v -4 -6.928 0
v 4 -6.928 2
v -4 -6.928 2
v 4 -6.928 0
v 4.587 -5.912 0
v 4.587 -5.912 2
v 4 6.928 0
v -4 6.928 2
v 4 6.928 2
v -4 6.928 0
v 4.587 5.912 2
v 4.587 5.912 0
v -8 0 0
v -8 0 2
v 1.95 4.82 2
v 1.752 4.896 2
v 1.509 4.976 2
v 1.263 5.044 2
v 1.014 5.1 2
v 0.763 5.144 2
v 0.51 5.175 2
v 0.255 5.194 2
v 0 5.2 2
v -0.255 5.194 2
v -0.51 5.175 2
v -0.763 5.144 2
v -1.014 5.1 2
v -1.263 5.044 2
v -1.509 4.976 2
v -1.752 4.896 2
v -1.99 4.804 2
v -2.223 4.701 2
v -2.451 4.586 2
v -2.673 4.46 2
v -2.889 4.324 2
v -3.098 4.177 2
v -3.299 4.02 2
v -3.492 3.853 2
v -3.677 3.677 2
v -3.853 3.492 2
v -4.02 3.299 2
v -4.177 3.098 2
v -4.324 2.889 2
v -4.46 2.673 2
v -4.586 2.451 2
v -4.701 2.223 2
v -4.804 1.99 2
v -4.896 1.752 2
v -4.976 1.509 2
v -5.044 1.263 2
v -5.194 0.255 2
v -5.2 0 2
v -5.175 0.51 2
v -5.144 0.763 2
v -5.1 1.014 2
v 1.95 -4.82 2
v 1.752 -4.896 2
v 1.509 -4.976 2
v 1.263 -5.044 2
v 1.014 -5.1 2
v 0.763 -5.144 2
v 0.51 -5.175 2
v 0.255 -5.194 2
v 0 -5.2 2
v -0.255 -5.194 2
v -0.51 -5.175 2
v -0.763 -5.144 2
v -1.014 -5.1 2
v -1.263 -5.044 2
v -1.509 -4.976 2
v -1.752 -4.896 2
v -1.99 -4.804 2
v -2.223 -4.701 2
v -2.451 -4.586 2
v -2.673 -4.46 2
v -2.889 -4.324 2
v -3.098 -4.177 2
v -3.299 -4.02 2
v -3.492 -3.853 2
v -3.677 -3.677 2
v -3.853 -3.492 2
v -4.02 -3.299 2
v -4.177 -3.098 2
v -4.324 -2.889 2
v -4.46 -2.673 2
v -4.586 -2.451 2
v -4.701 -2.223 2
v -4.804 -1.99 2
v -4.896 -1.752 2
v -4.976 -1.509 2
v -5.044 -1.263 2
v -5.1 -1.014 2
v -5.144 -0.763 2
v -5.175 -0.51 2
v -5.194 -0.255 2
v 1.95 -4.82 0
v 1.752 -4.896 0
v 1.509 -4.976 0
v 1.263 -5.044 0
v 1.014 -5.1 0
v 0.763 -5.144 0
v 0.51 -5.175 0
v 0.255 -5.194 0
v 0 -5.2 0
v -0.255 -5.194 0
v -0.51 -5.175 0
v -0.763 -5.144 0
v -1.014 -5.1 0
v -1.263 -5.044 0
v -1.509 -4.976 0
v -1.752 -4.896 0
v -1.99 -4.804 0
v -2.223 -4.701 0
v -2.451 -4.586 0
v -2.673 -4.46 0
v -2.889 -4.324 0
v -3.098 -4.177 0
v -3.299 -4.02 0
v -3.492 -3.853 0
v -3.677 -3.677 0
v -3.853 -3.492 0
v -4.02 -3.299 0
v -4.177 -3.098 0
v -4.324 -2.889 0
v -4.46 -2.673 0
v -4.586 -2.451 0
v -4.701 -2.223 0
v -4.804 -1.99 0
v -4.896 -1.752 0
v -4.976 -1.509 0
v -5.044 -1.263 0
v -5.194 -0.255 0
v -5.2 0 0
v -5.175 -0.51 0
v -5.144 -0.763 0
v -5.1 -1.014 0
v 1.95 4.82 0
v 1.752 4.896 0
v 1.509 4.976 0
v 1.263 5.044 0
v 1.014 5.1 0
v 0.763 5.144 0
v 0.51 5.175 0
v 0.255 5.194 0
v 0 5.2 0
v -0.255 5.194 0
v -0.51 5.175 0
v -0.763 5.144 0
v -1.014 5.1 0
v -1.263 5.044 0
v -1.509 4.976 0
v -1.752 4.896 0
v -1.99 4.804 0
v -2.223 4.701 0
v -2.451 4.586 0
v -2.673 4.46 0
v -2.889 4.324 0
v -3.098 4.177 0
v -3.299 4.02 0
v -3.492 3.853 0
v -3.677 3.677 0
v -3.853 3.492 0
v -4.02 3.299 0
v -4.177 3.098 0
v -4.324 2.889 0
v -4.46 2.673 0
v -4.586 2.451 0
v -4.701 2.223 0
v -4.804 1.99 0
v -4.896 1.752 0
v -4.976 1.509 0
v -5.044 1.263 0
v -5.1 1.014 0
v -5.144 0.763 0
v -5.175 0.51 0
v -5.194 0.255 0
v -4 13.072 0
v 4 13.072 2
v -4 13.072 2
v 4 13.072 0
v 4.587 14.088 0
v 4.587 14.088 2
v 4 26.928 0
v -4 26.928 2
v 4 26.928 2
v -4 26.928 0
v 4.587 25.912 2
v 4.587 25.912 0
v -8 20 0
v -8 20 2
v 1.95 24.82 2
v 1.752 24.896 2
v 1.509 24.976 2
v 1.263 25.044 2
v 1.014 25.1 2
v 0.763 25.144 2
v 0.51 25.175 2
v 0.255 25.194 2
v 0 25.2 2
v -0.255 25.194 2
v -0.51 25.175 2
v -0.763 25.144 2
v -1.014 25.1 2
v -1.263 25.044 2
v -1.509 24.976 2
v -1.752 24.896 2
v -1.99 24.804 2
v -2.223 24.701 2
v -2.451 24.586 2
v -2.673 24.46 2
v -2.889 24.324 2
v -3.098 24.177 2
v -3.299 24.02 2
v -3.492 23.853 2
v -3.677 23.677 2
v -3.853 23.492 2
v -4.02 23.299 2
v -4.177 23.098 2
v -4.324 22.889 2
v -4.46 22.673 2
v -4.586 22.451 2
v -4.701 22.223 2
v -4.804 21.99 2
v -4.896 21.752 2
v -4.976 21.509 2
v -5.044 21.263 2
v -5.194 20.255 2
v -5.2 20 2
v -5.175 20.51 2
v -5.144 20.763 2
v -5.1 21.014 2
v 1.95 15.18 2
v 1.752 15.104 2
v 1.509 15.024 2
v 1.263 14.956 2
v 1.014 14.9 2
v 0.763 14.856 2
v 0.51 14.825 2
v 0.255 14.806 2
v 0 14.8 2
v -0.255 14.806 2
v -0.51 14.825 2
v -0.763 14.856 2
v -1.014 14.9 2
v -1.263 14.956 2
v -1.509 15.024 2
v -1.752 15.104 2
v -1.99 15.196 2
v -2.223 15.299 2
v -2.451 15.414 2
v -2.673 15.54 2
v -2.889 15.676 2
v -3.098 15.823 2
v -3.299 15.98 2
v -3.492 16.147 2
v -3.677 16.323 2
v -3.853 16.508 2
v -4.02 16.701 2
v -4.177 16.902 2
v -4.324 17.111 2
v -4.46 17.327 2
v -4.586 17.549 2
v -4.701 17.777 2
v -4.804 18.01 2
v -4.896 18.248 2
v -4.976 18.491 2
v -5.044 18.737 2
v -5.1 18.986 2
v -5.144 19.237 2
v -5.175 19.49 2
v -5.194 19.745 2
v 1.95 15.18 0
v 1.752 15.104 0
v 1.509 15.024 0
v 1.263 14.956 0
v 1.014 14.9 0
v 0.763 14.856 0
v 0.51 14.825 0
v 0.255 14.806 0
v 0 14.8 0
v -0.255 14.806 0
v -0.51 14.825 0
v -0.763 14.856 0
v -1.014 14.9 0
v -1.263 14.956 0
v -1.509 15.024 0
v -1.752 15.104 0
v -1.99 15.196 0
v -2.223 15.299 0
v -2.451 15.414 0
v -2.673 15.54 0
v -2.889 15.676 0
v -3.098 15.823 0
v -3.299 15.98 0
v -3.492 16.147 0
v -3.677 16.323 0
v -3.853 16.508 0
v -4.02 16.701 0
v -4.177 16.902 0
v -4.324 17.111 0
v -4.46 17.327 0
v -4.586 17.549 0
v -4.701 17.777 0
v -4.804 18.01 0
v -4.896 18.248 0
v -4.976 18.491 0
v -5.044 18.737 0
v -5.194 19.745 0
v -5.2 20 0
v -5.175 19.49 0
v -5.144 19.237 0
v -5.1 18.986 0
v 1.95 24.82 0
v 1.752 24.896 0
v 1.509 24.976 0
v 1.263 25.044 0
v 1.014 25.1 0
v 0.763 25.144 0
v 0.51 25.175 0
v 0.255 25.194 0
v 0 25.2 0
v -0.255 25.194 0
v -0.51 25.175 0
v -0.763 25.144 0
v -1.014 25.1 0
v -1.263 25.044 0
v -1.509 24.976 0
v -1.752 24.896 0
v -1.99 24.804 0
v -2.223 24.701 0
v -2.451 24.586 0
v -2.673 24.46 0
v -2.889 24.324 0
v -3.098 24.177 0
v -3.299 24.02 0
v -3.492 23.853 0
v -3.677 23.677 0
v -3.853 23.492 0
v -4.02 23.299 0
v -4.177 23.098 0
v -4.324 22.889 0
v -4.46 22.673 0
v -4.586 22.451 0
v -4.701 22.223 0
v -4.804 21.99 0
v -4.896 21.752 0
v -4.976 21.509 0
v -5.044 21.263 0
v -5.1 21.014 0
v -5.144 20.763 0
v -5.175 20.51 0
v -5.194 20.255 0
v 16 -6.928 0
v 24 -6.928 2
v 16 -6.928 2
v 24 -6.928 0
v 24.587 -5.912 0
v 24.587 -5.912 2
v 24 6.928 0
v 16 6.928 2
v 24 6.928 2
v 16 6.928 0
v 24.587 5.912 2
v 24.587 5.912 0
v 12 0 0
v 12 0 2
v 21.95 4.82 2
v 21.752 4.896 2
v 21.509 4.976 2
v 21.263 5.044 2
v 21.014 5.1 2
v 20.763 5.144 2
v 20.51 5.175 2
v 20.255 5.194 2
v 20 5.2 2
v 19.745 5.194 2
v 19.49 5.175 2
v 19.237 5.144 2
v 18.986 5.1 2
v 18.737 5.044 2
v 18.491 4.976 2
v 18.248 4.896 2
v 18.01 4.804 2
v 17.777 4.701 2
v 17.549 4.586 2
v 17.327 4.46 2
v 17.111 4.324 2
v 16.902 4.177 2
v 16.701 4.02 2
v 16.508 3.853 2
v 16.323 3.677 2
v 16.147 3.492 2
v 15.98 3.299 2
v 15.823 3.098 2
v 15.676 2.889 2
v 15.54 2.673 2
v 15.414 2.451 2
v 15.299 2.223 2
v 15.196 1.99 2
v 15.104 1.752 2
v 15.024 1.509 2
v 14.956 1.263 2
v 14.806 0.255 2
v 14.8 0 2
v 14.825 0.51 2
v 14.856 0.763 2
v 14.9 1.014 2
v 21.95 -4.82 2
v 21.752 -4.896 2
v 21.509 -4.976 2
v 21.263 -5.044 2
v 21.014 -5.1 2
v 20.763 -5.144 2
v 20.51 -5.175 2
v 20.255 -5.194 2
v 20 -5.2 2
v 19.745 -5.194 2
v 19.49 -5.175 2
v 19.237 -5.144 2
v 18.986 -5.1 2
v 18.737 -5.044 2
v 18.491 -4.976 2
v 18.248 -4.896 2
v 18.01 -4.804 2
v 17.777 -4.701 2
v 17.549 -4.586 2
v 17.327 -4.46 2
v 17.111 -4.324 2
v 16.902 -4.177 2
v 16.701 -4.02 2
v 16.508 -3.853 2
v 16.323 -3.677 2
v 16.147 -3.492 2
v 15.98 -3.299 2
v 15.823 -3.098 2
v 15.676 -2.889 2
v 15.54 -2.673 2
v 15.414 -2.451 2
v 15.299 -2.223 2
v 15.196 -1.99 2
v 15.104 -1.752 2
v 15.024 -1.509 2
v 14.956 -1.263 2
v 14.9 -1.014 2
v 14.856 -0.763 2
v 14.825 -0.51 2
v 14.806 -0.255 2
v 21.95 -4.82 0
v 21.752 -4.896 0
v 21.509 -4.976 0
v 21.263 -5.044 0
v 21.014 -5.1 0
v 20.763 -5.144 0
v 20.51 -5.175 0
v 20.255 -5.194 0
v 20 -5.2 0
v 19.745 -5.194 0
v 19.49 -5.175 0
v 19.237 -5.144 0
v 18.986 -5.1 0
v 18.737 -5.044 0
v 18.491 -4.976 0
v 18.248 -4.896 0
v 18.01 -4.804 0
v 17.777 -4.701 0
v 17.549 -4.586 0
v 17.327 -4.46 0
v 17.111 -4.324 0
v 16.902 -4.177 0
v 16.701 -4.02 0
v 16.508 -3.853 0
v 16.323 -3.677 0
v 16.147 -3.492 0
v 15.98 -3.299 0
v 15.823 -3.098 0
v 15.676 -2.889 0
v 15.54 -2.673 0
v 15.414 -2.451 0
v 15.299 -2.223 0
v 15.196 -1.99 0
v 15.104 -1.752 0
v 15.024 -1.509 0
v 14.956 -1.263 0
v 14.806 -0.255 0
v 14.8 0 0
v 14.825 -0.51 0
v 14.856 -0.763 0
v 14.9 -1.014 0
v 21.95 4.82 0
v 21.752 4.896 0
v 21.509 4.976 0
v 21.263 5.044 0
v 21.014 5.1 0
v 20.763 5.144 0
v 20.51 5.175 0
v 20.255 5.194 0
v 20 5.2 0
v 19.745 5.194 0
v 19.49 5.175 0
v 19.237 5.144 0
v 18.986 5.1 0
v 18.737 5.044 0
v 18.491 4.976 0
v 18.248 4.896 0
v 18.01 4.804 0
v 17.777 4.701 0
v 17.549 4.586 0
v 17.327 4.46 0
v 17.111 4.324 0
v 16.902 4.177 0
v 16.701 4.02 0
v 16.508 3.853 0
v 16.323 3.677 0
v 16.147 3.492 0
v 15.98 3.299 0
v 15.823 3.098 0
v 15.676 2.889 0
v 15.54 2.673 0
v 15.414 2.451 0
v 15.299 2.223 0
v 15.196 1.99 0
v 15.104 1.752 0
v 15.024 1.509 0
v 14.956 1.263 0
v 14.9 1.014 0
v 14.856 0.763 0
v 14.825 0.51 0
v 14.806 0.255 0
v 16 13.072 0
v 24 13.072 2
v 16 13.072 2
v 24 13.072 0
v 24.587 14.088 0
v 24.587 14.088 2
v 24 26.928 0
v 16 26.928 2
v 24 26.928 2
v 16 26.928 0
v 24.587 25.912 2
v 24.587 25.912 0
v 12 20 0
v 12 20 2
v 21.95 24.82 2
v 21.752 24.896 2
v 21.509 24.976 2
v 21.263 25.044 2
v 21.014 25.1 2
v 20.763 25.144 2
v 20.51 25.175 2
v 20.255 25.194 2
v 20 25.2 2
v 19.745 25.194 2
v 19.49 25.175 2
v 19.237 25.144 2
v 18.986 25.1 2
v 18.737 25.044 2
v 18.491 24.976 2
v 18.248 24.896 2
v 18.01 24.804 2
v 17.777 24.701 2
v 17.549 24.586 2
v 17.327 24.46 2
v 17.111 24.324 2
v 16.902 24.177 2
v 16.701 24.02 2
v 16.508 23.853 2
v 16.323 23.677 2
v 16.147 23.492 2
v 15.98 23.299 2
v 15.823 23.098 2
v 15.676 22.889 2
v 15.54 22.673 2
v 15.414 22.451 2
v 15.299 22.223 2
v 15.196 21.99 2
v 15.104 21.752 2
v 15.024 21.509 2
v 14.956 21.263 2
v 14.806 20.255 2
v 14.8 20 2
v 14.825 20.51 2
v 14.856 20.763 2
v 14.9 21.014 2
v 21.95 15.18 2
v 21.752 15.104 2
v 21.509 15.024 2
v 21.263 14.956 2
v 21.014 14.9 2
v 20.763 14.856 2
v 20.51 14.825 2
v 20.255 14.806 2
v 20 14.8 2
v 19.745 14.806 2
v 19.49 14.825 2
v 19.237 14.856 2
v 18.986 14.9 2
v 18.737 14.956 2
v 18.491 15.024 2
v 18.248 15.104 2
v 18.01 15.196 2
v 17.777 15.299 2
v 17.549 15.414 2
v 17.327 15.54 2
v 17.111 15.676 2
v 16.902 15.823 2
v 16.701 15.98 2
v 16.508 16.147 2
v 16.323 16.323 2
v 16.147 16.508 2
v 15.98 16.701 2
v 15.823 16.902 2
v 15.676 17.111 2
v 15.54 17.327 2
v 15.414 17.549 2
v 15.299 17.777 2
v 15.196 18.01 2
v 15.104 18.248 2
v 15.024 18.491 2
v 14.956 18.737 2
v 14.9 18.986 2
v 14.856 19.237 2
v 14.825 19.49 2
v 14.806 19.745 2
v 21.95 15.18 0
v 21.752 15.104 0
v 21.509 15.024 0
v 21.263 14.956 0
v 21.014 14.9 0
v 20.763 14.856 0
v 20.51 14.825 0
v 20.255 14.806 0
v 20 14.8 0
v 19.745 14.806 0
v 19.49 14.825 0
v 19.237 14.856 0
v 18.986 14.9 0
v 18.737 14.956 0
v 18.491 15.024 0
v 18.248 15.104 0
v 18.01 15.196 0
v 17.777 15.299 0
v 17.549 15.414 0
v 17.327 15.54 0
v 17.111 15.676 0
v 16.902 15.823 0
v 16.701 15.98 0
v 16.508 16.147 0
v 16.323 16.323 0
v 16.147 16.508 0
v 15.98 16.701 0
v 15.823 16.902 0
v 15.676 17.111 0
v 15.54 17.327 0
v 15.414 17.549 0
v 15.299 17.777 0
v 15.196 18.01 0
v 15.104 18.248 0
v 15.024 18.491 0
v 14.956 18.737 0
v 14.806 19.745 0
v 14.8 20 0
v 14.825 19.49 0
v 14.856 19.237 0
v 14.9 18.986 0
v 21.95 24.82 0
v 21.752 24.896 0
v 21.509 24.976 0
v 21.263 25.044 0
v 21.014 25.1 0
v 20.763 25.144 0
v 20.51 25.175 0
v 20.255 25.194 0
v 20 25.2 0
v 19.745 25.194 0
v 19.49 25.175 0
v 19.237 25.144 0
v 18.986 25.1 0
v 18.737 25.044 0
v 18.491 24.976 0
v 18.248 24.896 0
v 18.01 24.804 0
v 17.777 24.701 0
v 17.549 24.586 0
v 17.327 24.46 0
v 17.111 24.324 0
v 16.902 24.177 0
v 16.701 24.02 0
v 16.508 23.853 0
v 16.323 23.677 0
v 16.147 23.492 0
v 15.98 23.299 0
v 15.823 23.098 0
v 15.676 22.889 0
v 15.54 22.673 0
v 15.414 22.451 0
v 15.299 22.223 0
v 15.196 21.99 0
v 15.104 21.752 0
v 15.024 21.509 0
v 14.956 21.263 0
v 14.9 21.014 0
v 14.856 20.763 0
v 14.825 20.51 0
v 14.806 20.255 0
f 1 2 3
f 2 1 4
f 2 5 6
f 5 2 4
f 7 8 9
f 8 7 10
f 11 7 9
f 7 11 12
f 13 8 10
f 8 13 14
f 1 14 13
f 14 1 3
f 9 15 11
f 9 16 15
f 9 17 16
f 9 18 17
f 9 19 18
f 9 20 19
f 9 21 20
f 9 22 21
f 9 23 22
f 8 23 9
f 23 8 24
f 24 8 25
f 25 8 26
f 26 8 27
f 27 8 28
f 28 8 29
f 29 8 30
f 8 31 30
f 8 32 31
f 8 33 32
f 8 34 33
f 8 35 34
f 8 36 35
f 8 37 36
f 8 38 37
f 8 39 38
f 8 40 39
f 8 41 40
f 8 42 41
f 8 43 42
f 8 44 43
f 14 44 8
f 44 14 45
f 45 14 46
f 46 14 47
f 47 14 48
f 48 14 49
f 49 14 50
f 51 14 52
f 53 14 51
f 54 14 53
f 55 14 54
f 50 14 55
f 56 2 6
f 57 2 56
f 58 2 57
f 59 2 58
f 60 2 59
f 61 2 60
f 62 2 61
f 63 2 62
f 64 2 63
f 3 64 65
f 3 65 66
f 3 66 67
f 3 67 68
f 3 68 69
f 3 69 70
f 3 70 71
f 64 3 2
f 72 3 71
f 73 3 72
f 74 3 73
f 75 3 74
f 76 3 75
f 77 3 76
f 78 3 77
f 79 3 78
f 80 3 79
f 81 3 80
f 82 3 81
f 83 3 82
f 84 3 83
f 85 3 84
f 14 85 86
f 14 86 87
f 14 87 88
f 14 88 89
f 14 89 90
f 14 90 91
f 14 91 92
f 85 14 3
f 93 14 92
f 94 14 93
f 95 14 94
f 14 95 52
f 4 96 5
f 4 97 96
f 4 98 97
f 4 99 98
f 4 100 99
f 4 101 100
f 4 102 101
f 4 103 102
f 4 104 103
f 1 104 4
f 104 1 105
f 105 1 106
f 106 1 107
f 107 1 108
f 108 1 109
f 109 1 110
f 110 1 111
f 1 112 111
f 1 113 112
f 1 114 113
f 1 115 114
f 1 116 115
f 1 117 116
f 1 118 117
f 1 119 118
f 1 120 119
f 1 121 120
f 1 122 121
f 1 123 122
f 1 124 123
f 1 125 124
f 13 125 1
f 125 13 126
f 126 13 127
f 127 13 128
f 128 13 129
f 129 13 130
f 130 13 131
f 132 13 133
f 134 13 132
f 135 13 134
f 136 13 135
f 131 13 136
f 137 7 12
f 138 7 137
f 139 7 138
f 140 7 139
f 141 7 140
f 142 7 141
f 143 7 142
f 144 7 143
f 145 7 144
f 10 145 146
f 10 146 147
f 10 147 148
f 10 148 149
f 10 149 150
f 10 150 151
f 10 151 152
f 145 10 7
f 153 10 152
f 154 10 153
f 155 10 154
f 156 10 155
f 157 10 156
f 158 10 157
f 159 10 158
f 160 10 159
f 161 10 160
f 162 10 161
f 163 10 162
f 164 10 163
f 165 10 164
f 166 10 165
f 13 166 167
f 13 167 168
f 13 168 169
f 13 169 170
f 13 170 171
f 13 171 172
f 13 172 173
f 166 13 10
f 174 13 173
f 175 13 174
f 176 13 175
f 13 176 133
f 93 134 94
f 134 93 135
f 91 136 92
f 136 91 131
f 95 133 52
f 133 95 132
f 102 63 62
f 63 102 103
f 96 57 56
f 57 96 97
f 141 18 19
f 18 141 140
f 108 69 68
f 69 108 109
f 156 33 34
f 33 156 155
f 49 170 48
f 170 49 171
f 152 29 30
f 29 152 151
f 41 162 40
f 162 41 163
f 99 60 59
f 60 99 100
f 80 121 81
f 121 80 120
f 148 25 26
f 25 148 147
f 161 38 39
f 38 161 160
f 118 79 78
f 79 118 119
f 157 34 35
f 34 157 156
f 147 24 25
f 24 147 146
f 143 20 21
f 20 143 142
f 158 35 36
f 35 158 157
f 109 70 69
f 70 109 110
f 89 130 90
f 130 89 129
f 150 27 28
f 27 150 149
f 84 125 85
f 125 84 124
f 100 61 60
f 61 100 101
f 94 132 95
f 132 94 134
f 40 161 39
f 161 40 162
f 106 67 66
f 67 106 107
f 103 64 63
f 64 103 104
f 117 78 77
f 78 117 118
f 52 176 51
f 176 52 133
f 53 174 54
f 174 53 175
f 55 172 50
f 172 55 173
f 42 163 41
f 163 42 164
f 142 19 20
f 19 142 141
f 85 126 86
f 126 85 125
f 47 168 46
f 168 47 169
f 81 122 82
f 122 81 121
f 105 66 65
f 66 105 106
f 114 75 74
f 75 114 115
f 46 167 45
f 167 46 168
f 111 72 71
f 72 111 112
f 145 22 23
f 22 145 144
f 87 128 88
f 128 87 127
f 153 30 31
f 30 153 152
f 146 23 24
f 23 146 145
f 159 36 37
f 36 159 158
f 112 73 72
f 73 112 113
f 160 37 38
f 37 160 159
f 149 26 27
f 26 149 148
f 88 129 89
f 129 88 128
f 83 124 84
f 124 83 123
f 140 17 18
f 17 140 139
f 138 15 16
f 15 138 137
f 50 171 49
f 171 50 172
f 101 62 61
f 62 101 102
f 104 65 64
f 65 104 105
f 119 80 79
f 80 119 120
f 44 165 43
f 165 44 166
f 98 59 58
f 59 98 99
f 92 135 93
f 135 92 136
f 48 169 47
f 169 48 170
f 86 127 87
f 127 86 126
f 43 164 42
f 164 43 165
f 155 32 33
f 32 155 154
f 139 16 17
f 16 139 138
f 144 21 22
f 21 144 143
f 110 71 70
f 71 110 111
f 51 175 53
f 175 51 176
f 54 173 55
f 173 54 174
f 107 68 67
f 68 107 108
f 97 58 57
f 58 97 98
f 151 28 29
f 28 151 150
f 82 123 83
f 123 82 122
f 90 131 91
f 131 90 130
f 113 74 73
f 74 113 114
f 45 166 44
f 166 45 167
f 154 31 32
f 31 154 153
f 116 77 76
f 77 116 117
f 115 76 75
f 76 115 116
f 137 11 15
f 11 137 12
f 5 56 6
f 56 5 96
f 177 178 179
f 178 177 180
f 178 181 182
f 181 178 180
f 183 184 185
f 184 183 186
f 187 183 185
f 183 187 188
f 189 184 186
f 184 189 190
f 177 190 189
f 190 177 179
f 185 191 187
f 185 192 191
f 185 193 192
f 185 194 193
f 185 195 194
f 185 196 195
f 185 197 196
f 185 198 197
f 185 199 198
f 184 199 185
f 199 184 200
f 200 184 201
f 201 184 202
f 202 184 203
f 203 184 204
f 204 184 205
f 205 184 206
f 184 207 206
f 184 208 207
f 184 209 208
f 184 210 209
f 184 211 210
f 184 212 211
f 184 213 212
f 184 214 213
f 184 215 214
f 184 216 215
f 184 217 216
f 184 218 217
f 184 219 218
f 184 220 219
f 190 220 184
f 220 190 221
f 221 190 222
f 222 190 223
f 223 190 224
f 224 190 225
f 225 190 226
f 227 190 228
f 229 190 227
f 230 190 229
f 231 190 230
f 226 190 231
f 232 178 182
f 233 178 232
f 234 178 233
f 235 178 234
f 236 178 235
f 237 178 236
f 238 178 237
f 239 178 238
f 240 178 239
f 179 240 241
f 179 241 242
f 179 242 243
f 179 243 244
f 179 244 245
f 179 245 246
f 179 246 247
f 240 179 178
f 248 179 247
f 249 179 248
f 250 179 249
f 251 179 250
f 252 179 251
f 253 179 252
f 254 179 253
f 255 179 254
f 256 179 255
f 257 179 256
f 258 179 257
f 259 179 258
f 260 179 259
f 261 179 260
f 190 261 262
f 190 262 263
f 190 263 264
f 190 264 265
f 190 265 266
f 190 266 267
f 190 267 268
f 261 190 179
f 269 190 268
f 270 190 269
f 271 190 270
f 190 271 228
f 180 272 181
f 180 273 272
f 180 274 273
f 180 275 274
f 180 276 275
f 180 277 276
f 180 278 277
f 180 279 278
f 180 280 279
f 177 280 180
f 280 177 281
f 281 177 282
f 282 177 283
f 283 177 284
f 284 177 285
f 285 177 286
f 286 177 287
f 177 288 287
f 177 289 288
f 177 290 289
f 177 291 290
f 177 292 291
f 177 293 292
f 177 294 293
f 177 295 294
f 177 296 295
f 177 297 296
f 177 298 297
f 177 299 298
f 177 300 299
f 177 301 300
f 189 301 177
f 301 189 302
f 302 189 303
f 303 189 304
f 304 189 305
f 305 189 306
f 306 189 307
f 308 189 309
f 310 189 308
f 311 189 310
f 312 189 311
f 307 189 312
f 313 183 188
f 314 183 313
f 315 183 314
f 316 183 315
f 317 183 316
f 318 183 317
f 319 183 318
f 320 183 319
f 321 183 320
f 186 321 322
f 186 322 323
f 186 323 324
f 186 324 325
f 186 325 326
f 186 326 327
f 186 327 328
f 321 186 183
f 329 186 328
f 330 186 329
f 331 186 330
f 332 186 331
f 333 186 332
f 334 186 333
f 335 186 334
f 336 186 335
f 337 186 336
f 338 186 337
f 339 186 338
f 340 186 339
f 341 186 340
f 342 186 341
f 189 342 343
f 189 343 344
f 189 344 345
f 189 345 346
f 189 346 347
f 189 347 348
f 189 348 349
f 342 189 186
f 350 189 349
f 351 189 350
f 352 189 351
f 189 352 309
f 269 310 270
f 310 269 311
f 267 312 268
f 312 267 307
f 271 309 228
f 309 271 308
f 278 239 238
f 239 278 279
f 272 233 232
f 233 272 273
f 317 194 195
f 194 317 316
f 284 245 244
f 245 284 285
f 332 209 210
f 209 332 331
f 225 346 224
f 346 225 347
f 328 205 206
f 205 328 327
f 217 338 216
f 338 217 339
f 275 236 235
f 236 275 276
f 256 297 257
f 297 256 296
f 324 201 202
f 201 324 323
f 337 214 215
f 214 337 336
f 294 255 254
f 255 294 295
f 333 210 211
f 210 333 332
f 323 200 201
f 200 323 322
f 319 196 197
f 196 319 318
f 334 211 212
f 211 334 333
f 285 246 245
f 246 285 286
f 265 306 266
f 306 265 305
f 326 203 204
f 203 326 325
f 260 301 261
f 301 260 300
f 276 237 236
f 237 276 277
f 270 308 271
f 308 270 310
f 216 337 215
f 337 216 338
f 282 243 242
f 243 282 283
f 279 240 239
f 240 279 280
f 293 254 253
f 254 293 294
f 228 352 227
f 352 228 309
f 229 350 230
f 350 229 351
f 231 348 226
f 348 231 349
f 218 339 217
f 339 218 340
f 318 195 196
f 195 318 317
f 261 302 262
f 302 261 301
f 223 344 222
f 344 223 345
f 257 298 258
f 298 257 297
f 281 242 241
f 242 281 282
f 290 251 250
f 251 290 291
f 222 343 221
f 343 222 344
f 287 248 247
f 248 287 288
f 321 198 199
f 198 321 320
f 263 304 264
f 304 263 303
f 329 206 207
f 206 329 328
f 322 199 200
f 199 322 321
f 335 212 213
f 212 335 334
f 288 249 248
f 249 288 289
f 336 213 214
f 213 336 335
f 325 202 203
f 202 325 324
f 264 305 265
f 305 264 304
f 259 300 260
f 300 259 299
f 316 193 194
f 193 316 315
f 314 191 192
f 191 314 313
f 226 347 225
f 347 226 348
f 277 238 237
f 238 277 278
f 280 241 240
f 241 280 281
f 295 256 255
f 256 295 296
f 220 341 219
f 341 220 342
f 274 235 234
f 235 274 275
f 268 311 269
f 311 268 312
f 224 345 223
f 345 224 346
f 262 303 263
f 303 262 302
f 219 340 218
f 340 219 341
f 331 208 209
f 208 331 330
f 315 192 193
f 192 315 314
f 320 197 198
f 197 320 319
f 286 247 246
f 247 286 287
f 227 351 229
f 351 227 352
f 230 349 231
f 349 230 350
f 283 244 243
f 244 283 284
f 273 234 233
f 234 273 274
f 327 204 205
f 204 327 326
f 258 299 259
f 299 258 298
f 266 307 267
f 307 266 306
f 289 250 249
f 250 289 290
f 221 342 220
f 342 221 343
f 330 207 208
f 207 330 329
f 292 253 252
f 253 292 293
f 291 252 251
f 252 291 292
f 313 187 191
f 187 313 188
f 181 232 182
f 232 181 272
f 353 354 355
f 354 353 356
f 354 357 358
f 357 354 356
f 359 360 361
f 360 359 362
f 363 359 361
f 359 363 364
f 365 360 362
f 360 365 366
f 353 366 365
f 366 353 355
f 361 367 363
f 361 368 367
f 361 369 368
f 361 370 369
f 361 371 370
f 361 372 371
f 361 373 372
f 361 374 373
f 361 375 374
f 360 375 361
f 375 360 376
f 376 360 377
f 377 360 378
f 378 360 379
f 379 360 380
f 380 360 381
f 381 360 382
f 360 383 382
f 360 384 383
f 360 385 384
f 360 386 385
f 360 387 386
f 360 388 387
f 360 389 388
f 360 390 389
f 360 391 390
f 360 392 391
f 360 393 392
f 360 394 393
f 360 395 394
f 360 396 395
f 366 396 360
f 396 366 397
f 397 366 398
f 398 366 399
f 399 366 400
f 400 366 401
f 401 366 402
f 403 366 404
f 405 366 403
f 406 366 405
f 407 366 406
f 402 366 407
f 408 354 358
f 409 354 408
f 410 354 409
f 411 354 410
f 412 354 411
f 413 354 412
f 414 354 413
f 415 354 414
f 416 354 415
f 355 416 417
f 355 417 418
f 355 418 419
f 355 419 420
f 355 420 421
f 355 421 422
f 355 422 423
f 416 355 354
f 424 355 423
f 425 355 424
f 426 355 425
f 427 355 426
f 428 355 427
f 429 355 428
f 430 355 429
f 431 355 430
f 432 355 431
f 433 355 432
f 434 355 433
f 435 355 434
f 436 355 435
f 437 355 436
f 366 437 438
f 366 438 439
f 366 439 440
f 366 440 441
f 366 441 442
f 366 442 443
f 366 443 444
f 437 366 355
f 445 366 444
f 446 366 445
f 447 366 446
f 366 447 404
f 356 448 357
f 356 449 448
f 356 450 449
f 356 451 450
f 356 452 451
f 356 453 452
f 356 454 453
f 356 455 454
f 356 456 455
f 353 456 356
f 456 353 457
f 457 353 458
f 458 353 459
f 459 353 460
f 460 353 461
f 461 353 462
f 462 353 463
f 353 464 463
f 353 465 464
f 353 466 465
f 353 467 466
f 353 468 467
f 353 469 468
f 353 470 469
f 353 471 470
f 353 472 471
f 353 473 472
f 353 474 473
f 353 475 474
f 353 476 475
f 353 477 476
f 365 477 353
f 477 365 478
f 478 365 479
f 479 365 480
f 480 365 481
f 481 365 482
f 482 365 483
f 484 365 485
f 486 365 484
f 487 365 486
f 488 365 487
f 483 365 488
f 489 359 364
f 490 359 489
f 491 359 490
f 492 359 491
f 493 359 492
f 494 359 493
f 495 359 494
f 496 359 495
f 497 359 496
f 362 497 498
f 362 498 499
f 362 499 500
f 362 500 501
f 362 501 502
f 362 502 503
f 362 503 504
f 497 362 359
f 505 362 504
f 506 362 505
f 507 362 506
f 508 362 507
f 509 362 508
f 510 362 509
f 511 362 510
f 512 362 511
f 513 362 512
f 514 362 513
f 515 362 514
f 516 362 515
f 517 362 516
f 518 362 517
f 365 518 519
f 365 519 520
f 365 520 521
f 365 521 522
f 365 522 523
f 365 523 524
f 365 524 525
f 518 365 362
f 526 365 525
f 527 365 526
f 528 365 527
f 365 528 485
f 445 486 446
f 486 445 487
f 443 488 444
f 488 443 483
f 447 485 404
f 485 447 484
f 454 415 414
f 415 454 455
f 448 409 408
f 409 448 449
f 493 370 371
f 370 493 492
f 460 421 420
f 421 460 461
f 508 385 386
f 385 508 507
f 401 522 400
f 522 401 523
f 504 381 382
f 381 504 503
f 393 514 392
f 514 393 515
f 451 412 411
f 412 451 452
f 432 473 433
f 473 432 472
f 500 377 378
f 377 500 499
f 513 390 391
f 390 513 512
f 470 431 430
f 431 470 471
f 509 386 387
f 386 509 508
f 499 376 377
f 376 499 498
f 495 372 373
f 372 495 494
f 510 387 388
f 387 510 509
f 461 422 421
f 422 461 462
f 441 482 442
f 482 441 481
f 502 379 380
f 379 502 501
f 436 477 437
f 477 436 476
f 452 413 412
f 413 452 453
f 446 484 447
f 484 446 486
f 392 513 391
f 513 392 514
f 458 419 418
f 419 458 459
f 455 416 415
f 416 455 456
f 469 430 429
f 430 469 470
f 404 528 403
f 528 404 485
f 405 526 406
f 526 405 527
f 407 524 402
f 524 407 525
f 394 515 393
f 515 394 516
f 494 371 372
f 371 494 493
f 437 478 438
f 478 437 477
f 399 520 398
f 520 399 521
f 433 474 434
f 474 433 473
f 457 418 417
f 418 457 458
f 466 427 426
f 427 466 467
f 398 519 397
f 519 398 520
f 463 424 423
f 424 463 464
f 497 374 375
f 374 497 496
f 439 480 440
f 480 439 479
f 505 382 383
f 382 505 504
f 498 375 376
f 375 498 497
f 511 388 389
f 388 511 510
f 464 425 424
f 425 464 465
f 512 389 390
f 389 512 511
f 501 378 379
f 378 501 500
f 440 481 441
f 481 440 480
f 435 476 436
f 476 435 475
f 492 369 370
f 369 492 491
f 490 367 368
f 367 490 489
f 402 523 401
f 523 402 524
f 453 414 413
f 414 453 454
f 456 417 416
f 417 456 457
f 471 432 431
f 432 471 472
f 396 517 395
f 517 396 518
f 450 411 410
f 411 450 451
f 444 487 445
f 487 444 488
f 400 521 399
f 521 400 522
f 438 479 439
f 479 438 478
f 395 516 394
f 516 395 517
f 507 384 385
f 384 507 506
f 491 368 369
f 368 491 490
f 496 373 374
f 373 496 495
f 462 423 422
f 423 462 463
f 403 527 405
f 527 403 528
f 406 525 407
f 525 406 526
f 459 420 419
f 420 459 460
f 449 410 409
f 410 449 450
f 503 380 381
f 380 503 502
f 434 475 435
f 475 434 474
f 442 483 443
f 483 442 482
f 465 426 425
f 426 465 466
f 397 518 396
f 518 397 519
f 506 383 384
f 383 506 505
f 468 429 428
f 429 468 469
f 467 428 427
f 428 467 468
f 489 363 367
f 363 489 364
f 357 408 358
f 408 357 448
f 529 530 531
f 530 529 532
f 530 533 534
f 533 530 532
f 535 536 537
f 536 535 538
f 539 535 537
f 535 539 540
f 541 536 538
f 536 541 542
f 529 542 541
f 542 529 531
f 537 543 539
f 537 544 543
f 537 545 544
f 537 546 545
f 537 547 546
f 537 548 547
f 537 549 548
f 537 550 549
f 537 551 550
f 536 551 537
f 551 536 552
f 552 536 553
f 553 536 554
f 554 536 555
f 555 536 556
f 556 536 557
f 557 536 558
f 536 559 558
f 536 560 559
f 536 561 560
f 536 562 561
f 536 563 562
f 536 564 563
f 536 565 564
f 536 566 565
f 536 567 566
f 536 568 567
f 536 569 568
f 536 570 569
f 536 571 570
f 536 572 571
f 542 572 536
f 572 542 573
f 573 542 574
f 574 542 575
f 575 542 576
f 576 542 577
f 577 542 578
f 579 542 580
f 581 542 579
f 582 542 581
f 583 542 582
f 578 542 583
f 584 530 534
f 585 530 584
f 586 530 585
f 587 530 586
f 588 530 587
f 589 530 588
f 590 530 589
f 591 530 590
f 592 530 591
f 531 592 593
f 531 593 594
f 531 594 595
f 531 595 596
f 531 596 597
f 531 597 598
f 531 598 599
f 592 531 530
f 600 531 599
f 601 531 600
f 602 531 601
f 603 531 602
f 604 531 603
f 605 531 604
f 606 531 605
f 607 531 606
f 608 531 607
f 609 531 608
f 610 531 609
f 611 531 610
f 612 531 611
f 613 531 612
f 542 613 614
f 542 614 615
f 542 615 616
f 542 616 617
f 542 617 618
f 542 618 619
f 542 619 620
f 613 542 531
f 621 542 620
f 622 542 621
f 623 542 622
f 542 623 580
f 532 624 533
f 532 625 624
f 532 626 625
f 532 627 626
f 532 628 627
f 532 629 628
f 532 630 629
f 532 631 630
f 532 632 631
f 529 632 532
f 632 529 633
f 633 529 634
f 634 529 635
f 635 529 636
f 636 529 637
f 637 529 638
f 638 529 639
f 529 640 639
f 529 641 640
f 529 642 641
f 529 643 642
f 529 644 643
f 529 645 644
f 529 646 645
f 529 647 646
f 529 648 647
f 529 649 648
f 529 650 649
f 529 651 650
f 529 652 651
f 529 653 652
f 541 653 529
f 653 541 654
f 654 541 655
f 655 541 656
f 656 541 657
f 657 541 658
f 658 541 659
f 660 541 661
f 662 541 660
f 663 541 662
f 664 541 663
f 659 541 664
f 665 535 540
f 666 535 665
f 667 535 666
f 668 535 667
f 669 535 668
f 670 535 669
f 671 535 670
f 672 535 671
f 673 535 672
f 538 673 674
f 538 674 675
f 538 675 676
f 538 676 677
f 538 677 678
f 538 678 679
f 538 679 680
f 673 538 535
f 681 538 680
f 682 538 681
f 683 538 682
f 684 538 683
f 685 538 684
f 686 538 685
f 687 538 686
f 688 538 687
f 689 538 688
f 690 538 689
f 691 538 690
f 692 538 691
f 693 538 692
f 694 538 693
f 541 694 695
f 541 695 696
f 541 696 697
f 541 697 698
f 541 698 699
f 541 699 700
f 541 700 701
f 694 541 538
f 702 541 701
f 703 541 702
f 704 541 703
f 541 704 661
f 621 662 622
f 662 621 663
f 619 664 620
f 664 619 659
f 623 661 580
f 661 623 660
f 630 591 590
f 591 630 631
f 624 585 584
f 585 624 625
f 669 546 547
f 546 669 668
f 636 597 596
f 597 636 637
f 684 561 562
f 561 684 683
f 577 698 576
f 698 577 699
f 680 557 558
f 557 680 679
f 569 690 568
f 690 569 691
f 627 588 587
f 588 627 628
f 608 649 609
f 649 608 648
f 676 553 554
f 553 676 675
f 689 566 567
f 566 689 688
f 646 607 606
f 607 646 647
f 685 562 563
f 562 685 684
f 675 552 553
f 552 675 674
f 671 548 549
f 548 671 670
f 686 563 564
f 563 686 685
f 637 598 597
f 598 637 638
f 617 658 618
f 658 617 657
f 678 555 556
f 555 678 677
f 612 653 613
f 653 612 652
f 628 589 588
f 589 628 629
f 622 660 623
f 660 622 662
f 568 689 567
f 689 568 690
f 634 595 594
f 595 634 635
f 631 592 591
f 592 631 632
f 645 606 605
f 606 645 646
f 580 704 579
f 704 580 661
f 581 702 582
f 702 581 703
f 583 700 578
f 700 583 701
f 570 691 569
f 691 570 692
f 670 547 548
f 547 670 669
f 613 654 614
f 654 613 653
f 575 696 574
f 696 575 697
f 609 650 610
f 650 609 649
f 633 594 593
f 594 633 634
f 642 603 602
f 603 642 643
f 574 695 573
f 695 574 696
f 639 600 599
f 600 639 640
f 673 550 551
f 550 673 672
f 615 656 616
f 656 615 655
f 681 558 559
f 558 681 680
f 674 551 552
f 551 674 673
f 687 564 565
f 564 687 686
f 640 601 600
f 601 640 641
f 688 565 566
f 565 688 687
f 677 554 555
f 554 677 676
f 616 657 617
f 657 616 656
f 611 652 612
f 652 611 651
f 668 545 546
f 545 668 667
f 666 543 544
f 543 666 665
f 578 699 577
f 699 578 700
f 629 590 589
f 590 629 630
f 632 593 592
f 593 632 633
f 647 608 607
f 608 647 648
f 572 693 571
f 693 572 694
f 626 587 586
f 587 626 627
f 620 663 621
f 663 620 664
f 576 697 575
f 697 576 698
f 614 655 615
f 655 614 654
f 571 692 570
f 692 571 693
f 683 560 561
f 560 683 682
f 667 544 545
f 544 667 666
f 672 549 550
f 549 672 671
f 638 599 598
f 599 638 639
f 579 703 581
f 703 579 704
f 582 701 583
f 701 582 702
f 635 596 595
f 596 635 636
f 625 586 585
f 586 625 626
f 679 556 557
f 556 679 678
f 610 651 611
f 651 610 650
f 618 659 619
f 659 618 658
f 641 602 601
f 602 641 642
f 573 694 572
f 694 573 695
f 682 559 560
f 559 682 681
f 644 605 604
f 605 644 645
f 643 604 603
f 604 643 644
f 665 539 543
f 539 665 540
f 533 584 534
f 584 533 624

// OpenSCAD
// Clip parts for nozzle changer
// by Genie Kibayashi, July 2016

$fn=128;
r_margin = 0.4;

//T2
module clip(){
difference(){
cylinder(h=2, r=8, $fn=6);

translate([0,0,-1])
cylinder(h=4, r=10/2+r_margin/2);

translate([4.8,0,-1])
cylinder(h=4, r=6, $fn=8);
 }
}

for (i = [0:20:20]) 
 for (j = [0:20:20]) {
translate([i,j,0])
clip();
}
